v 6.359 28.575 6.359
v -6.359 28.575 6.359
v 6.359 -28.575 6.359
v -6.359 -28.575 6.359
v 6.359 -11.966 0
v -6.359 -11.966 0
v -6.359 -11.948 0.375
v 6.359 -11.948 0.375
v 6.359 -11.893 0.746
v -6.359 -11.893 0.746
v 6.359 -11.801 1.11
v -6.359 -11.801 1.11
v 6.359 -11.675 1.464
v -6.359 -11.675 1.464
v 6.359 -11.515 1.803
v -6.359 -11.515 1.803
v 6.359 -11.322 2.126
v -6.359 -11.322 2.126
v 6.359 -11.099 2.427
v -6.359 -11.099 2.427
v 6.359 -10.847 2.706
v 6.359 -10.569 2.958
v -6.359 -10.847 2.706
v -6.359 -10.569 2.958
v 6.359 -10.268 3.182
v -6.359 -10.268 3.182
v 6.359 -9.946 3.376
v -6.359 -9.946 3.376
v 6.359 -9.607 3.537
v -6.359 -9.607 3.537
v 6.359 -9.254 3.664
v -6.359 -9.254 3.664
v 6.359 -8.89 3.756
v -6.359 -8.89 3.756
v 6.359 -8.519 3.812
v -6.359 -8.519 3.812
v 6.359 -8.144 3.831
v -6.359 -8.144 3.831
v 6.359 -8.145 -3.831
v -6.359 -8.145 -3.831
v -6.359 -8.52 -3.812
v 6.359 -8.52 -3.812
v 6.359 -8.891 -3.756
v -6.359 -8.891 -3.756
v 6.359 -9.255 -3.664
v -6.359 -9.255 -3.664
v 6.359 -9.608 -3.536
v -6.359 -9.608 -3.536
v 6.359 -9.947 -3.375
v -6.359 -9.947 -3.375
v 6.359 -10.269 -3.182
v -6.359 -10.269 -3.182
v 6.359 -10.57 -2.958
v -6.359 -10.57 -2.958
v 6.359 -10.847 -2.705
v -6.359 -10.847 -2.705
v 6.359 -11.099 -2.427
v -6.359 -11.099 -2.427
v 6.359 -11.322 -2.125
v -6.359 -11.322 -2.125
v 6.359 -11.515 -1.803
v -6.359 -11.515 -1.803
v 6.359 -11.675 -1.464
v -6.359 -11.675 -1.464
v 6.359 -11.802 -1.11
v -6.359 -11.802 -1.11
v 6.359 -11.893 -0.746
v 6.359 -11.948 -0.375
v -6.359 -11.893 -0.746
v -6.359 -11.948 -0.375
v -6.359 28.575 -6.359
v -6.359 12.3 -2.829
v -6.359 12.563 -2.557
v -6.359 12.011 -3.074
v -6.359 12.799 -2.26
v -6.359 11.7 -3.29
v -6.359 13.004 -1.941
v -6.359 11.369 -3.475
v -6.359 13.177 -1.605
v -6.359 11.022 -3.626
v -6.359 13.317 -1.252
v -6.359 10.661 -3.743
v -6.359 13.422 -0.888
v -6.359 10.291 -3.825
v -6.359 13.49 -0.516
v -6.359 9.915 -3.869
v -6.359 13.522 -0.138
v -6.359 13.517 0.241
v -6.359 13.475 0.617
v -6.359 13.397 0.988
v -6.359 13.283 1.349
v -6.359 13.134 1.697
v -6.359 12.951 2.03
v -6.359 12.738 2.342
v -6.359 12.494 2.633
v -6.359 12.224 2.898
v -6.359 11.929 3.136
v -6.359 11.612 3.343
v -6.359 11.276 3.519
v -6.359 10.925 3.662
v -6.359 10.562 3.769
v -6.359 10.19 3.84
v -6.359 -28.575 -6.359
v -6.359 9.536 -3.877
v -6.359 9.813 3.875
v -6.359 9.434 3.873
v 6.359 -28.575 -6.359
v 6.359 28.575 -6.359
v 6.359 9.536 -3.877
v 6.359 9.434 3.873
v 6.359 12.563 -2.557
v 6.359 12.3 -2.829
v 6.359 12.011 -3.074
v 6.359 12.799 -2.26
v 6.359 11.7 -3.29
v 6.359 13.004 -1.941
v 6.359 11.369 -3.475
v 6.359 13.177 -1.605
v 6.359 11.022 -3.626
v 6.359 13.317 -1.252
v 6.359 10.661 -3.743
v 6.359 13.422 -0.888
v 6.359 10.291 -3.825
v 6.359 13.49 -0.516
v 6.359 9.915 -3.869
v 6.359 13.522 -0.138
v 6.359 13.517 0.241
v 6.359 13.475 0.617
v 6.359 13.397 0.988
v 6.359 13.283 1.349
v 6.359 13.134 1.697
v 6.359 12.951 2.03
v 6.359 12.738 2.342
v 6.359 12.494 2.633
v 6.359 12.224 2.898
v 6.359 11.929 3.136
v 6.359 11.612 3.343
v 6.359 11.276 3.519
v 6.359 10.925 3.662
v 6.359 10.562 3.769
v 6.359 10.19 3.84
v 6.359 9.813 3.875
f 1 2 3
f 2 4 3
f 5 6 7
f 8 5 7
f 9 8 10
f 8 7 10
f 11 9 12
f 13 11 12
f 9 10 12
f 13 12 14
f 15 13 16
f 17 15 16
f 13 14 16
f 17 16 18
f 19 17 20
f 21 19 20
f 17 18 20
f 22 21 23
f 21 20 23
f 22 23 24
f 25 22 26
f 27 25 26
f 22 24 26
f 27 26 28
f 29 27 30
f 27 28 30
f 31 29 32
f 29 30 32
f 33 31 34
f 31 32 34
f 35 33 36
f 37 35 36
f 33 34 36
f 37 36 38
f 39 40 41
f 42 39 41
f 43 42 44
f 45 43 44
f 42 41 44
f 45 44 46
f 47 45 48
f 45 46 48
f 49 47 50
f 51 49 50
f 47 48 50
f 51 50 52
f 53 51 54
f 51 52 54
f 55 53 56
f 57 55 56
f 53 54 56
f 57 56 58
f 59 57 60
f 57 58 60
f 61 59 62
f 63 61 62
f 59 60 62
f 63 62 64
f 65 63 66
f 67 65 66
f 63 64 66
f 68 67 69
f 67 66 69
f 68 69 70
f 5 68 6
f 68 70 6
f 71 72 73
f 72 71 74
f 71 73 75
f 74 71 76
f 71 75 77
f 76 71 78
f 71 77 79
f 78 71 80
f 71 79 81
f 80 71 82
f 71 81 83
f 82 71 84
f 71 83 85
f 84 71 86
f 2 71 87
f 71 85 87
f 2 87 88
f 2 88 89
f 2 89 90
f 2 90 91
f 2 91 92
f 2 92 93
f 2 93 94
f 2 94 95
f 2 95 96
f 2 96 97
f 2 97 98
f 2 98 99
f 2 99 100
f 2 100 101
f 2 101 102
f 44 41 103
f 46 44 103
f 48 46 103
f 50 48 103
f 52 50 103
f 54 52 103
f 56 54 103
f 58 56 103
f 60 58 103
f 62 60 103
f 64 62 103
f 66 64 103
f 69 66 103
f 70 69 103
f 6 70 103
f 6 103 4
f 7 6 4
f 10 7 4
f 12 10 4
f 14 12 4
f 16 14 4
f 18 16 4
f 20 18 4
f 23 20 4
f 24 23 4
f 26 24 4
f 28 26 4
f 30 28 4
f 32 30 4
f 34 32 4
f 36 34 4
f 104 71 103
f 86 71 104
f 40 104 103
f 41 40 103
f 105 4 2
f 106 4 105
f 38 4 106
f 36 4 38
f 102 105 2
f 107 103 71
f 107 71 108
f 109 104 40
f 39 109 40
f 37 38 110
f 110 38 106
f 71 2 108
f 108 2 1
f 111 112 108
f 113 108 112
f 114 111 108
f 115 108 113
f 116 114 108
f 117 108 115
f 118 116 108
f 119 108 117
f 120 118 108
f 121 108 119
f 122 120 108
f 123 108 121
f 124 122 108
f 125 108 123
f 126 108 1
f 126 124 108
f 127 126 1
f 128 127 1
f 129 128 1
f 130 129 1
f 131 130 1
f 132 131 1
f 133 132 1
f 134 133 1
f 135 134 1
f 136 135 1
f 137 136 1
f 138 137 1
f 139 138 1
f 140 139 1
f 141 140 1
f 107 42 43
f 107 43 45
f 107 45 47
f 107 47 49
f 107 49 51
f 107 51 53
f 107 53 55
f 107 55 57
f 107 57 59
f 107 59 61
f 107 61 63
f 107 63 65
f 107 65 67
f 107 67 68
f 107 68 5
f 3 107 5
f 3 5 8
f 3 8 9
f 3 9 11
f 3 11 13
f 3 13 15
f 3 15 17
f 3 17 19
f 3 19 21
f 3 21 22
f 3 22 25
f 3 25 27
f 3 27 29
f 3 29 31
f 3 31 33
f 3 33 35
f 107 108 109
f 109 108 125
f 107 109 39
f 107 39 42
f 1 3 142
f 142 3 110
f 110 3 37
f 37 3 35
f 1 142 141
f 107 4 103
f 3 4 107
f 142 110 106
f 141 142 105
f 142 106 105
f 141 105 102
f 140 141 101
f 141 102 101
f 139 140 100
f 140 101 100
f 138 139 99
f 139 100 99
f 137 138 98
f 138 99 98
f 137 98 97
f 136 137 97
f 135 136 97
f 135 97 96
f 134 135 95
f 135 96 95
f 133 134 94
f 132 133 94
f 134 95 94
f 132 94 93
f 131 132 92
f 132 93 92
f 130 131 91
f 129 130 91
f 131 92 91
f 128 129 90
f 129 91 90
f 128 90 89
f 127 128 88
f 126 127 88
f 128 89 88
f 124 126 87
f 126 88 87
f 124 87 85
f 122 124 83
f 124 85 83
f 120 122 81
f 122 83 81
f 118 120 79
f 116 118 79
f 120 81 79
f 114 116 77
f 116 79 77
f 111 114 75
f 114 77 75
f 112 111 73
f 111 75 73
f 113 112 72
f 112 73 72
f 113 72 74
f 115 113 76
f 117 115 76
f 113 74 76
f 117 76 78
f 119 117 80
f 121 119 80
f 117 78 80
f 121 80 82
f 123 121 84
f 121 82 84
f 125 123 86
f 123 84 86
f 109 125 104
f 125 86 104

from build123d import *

# Parameters (mm, degrees)
F0_W     = 12.717748
F0_H     = 12.717748
F1_DEPTH = 28.575
F3_DEPTH = 12.717748


with BuildPart() as f1:
    # F0 (on Front) → F1 (new body, symmetric)
    with BuildSketch(Plane.XZ):
        Rectangle(F0_W, F0_H)
    extrude(amount=F1_DEPTH, both=True)

    # F2 (on face) → F3 (cut, through all)
    with BuildSketch(Plane(origin=(-6.358874, 0, 0), x_dir=(0, -1, 0), z_dir=(-1, 0, 0))):
        with BuildLine():
            ThreePointArc((-9.433768, 3.872642), (-6.829732, 2.666259), (-5.767928, 0))
            ThreePointArc((-5.767928, 0), (-6.865206, -2.703241), (-9.536167, -3.876908))
            Line((-9.536167, -3.876908), (8.144981, -3.830927))
            ThreePointArc((8.144981, -3.830927), (4.304078, -0.000436), (8.144109, 3.830929))
            Line((8.144109, 3.830929), (-9.433768, 3.872642))
        make_face()
        with BuildLine():
            ThreePointArc((11.965958, 0), (10.847114, 2.705668), (8.144109, 3.830929))
            ThreePointArc((8.144109, 3.830929), (4.304078, -0.000436), (8.144981, -3.830927))
            ThreePointArc((8.144981, -3.830927), (10.847422, -2.705359), (11.965958, 0))
        make_face()
        with BuildLine():
            ThreePointArc((-9.536167, -3.876908), (-6.865206, -2.703241), (-5.767928, 0))
            ThreePointArc((-5.767928, 0), (-6.829732, 2.666259), (-9.433768, 3.872642))
            ThreePointArc((-9.433768, 3.872642), (-13.524539, 0.051244), (-9.536167, -3.876908))
        make_face()
    extrude(amount=-F3_DEPTH, mode=Mode.SUBTRACT)


solid = f1.part
